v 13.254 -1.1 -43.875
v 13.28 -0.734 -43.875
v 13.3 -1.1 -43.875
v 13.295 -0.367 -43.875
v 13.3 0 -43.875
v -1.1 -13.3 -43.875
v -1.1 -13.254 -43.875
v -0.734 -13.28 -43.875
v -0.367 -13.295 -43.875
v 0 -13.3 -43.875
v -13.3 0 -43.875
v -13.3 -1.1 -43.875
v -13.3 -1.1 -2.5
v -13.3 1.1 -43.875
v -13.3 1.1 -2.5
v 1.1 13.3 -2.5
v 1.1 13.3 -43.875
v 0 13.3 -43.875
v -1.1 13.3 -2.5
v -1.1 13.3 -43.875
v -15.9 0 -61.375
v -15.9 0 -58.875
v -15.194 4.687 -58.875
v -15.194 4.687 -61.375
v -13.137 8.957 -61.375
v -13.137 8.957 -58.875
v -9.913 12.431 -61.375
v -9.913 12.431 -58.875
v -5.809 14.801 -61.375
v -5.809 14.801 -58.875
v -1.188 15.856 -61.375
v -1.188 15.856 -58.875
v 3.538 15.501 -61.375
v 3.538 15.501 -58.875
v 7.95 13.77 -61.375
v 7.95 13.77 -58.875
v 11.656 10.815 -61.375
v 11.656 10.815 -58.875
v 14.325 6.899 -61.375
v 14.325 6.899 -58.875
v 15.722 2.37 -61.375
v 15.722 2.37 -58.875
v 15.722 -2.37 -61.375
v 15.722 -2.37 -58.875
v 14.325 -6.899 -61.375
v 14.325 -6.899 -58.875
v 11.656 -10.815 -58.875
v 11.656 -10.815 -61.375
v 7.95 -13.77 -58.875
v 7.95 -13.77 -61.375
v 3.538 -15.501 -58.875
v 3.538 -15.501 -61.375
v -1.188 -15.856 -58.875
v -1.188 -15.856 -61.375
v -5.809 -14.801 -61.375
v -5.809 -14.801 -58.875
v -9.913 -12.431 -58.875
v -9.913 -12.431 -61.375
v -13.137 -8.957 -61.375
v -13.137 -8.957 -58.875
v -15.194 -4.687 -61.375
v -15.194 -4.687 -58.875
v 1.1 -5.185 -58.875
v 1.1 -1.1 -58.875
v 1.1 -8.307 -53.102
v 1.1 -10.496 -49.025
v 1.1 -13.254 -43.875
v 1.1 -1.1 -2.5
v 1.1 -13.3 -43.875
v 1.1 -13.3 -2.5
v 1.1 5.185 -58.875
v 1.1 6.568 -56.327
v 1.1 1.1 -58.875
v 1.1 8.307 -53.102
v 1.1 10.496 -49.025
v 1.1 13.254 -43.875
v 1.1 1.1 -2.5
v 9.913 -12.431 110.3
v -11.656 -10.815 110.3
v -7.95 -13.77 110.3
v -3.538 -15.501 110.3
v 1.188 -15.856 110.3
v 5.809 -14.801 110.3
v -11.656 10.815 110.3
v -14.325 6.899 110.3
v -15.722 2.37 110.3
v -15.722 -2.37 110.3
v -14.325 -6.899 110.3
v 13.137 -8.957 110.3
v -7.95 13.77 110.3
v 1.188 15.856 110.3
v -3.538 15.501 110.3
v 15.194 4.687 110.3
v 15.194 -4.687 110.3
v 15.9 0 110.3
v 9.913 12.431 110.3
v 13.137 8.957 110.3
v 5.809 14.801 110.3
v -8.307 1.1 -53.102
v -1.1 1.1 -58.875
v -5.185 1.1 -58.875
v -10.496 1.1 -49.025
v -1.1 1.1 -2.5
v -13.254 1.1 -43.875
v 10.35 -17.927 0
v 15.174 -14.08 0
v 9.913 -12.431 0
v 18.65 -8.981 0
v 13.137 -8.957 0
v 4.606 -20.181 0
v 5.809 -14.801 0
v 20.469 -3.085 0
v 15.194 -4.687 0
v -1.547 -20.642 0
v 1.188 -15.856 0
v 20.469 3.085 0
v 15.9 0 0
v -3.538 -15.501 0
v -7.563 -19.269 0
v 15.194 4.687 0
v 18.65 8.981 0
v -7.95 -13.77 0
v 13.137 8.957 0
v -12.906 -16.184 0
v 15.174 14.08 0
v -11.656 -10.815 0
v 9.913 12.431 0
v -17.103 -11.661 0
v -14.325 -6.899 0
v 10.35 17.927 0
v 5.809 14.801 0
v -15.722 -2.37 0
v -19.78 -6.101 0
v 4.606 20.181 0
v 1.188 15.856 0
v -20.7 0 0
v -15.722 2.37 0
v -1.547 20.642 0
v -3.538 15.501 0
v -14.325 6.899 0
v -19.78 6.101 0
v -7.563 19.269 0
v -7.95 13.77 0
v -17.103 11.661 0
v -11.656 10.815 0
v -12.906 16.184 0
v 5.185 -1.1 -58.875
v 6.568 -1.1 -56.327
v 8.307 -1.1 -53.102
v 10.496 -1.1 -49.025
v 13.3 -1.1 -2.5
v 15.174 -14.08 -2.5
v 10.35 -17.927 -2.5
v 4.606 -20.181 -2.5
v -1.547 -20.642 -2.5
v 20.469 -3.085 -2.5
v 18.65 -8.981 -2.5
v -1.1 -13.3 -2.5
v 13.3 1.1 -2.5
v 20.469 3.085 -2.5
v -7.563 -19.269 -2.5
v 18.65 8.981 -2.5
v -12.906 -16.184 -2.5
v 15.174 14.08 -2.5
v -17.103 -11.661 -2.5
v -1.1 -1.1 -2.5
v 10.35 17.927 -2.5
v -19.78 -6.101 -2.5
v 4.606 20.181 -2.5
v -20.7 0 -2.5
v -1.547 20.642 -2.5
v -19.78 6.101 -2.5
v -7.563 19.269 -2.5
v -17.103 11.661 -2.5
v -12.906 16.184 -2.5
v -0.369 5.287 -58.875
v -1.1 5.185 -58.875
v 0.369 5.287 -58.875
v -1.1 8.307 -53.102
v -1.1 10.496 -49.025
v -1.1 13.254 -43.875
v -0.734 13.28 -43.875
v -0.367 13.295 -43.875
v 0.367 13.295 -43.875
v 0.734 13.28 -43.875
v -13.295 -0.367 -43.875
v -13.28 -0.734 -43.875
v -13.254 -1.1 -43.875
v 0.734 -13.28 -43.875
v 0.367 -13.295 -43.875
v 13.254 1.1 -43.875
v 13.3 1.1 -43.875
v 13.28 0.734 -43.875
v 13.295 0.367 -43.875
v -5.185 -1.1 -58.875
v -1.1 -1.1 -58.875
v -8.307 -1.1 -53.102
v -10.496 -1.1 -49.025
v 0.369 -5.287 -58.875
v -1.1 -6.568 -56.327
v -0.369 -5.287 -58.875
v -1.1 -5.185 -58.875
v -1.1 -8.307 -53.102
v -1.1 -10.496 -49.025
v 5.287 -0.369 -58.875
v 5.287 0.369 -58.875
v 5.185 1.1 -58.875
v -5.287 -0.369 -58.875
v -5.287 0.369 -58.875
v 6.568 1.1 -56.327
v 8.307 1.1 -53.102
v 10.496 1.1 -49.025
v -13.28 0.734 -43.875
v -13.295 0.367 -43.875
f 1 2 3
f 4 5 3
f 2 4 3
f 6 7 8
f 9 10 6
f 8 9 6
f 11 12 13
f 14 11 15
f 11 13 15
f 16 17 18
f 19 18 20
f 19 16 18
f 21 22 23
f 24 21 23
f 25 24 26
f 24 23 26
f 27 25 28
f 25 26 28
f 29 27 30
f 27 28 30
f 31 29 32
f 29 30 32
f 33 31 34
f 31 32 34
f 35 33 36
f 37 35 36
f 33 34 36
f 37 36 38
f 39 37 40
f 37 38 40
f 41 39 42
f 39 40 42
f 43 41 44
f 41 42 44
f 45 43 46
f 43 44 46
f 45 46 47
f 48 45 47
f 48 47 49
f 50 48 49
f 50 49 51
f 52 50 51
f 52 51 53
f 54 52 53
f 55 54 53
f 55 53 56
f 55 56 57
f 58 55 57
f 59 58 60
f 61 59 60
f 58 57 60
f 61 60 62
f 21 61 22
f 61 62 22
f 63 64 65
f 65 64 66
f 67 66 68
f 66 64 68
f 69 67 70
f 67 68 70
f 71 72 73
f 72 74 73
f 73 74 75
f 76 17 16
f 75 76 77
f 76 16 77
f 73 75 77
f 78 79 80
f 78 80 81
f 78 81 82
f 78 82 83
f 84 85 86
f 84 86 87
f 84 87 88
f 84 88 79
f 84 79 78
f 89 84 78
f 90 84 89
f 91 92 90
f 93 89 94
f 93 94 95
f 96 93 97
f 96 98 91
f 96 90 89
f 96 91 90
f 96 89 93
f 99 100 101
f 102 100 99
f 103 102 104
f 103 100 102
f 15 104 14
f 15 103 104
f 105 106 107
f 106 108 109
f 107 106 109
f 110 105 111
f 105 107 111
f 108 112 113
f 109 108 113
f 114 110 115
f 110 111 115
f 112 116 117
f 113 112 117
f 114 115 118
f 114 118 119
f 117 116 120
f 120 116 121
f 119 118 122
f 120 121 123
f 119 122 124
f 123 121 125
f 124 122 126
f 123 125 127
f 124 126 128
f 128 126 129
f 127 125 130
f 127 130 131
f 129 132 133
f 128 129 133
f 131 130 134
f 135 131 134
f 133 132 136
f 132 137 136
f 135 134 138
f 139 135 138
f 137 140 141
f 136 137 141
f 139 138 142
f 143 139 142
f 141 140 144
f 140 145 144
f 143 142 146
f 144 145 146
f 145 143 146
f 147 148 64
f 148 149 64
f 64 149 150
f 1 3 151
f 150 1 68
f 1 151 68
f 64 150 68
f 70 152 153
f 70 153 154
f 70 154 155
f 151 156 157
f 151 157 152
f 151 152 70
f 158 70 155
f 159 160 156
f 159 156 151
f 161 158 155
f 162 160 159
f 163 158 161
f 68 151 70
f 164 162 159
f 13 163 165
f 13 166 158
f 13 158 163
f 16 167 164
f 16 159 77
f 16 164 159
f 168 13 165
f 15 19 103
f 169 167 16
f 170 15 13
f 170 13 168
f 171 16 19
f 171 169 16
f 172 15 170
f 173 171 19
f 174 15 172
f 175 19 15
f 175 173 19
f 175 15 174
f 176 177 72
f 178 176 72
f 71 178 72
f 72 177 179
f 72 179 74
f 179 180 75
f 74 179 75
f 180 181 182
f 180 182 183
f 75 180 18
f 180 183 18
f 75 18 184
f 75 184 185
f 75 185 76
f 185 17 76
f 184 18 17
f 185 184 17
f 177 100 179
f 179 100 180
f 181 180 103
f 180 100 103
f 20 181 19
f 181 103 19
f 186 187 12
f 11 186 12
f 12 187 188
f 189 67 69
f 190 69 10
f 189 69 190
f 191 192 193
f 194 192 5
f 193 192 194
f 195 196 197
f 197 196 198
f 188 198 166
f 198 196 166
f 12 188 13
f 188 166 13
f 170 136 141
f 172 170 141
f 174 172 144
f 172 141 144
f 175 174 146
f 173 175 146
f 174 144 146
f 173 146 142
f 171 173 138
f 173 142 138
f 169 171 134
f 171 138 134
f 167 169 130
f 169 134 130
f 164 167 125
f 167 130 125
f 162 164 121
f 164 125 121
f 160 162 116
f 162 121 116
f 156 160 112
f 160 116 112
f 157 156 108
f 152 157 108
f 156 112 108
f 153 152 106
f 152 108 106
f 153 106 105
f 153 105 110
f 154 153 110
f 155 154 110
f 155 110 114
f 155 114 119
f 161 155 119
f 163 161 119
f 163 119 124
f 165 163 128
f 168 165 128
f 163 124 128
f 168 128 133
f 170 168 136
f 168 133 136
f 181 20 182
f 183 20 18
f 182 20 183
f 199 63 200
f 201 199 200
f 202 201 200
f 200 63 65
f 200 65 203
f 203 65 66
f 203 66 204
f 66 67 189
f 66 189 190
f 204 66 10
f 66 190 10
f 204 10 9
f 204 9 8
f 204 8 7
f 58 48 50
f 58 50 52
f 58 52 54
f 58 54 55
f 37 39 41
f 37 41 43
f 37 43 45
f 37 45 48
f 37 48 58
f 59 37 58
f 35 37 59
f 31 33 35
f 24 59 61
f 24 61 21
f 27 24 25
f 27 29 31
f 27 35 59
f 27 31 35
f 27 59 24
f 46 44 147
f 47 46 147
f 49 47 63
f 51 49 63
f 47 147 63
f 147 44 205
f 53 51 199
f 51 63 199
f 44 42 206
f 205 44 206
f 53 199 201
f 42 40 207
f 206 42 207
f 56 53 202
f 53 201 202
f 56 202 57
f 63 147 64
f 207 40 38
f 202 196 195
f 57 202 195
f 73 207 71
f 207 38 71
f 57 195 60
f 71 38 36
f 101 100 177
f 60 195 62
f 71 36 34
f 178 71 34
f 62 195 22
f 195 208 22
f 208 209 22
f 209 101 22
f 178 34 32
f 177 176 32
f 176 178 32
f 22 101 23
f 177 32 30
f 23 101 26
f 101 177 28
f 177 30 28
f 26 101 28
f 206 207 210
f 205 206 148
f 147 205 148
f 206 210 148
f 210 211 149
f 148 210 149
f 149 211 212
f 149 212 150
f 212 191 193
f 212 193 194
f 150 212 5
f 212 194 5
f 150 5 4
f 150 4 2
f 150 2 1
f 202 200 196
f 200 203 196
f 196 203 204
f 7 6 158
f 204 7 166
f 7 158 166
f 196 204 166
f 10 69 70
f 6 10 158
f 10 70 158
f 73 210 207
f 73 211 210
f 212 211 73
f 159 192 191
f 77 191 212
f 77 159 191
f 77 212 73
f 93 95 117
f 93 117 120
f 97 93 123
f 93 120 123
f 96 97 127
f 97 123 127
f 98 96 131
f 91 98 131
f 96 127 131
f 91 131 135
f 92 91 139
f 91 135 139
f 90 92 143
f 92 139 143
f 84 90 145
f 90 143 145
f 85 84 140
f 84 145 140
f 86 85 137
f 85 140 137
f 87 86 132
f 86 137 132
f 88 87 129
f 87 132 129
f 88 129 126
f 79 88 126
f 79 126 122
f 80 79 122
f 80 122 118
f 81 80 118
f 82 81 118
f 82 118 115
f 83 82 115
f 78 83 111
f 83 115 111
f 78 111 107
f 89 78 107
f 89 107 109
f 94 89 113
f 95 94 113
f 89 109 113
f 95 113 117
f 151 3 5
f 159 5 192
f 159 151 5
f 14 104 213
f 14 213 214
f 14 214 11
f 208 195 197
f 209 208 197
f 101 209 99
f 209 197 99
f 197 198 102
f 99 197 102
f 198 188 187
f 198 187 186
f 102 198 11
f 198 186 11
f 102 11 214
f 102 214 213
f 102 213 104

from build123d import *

# Parameters (mm, degrees)
SKETCH1_R           = 15.9
BOSS_EXTRUDE1_DEPTH = 110.3
SKETCH4_R           = 20.7
BOSS_EXTRUDE4_DEPTH = 2.5
SKETCH2_W           = 2.2
SKETCH2_H           = 12.2
SKETCH2_H_2         = 2.2
SKETCH2_W_2         = 12.2
BOSS_EXTRUDE2_DEPTH = 56.375
SKETCH3_R           = 15.9
BOSS_EXTRUDE3_DEPTH = 2.5
SKETCH5_W           = 15
SKETCH5_H           = 1.651179813


with BuildPart() as part:
    # Sketch1 → Boss-Extrude1 (new body)
    with BuildSketch(Plane.XY):
        Circle(SKETCH1_R)
    extrude(amount=BOSS_EXTRUDE1_DEPTH)

    # Sketch4 → Boss-Extrude4 (add)
    with BuildSketch(Plane(origin=(0, 0, 0), x_dir=(-1, 0, 0), z_dir=(0, 0, -1))):
        Circle(SKETCH4_R)
    extrude(amount=BOSS_EXTRUDE4_DEPTH)

    # Sketch2 → Boss-Extrude2 (add)
    with BuildSketch(Plane(origin=(0, 0, -2.5), x_dir=(-1, 0, 0), z_dir=(0, 0, -1))):
        with Locations((0, 7.2)):
            Rectangle(SKETCH2_W, SKETCH2_H)
        Rectangle(SKETCH2_W, SKETCH2_H_2)
        with Locations((0, -7.2)):
            Rectangle(SKETCH2_W, SKETCH2_H)
        with Locations((7.2, 0)):
            Rectangle(SKETCH2_W_2, SKETCH2_H_2)
        with Locations((-7.2, 0)):
            Rectangle(SKETCH2_W_2, SKETCH2_H_2)
    extrude(amount=BOSS_EXTRUDE2_DEPTH)

    # Sketch3 → Boss-Extrude3 (add)
    with BuildSketch(Plane(origin=(0, 0, -58.875), x_dir=(-1, 0, 0), z_dir=(0, 0, -1))):
        Circle(SKETCH3_R)
    extrude(amount=BOSS_EXTRUDE3_DEPTH)

    # Sketch5 → Cut-Revolve4 (revolve, cut)
    with BuildSketch(Plane(origin=(0, 0, 0), x_dir=(0, 0, -1), z_dir=(1, 0, 0))):
        with Locations((51.375, 14.125589907)):
            Rectangle(SKETCH5_W, SKETCH5_H)
        Polygon((58.875, 13.3), (58.875, 5.3), (43.875, 13.3), align=None)
    revolve(axis=Axis((0, 0, 121.7025), (0, 0, -1)), mode=Mode.SUBTRACT)


solid = part.part
